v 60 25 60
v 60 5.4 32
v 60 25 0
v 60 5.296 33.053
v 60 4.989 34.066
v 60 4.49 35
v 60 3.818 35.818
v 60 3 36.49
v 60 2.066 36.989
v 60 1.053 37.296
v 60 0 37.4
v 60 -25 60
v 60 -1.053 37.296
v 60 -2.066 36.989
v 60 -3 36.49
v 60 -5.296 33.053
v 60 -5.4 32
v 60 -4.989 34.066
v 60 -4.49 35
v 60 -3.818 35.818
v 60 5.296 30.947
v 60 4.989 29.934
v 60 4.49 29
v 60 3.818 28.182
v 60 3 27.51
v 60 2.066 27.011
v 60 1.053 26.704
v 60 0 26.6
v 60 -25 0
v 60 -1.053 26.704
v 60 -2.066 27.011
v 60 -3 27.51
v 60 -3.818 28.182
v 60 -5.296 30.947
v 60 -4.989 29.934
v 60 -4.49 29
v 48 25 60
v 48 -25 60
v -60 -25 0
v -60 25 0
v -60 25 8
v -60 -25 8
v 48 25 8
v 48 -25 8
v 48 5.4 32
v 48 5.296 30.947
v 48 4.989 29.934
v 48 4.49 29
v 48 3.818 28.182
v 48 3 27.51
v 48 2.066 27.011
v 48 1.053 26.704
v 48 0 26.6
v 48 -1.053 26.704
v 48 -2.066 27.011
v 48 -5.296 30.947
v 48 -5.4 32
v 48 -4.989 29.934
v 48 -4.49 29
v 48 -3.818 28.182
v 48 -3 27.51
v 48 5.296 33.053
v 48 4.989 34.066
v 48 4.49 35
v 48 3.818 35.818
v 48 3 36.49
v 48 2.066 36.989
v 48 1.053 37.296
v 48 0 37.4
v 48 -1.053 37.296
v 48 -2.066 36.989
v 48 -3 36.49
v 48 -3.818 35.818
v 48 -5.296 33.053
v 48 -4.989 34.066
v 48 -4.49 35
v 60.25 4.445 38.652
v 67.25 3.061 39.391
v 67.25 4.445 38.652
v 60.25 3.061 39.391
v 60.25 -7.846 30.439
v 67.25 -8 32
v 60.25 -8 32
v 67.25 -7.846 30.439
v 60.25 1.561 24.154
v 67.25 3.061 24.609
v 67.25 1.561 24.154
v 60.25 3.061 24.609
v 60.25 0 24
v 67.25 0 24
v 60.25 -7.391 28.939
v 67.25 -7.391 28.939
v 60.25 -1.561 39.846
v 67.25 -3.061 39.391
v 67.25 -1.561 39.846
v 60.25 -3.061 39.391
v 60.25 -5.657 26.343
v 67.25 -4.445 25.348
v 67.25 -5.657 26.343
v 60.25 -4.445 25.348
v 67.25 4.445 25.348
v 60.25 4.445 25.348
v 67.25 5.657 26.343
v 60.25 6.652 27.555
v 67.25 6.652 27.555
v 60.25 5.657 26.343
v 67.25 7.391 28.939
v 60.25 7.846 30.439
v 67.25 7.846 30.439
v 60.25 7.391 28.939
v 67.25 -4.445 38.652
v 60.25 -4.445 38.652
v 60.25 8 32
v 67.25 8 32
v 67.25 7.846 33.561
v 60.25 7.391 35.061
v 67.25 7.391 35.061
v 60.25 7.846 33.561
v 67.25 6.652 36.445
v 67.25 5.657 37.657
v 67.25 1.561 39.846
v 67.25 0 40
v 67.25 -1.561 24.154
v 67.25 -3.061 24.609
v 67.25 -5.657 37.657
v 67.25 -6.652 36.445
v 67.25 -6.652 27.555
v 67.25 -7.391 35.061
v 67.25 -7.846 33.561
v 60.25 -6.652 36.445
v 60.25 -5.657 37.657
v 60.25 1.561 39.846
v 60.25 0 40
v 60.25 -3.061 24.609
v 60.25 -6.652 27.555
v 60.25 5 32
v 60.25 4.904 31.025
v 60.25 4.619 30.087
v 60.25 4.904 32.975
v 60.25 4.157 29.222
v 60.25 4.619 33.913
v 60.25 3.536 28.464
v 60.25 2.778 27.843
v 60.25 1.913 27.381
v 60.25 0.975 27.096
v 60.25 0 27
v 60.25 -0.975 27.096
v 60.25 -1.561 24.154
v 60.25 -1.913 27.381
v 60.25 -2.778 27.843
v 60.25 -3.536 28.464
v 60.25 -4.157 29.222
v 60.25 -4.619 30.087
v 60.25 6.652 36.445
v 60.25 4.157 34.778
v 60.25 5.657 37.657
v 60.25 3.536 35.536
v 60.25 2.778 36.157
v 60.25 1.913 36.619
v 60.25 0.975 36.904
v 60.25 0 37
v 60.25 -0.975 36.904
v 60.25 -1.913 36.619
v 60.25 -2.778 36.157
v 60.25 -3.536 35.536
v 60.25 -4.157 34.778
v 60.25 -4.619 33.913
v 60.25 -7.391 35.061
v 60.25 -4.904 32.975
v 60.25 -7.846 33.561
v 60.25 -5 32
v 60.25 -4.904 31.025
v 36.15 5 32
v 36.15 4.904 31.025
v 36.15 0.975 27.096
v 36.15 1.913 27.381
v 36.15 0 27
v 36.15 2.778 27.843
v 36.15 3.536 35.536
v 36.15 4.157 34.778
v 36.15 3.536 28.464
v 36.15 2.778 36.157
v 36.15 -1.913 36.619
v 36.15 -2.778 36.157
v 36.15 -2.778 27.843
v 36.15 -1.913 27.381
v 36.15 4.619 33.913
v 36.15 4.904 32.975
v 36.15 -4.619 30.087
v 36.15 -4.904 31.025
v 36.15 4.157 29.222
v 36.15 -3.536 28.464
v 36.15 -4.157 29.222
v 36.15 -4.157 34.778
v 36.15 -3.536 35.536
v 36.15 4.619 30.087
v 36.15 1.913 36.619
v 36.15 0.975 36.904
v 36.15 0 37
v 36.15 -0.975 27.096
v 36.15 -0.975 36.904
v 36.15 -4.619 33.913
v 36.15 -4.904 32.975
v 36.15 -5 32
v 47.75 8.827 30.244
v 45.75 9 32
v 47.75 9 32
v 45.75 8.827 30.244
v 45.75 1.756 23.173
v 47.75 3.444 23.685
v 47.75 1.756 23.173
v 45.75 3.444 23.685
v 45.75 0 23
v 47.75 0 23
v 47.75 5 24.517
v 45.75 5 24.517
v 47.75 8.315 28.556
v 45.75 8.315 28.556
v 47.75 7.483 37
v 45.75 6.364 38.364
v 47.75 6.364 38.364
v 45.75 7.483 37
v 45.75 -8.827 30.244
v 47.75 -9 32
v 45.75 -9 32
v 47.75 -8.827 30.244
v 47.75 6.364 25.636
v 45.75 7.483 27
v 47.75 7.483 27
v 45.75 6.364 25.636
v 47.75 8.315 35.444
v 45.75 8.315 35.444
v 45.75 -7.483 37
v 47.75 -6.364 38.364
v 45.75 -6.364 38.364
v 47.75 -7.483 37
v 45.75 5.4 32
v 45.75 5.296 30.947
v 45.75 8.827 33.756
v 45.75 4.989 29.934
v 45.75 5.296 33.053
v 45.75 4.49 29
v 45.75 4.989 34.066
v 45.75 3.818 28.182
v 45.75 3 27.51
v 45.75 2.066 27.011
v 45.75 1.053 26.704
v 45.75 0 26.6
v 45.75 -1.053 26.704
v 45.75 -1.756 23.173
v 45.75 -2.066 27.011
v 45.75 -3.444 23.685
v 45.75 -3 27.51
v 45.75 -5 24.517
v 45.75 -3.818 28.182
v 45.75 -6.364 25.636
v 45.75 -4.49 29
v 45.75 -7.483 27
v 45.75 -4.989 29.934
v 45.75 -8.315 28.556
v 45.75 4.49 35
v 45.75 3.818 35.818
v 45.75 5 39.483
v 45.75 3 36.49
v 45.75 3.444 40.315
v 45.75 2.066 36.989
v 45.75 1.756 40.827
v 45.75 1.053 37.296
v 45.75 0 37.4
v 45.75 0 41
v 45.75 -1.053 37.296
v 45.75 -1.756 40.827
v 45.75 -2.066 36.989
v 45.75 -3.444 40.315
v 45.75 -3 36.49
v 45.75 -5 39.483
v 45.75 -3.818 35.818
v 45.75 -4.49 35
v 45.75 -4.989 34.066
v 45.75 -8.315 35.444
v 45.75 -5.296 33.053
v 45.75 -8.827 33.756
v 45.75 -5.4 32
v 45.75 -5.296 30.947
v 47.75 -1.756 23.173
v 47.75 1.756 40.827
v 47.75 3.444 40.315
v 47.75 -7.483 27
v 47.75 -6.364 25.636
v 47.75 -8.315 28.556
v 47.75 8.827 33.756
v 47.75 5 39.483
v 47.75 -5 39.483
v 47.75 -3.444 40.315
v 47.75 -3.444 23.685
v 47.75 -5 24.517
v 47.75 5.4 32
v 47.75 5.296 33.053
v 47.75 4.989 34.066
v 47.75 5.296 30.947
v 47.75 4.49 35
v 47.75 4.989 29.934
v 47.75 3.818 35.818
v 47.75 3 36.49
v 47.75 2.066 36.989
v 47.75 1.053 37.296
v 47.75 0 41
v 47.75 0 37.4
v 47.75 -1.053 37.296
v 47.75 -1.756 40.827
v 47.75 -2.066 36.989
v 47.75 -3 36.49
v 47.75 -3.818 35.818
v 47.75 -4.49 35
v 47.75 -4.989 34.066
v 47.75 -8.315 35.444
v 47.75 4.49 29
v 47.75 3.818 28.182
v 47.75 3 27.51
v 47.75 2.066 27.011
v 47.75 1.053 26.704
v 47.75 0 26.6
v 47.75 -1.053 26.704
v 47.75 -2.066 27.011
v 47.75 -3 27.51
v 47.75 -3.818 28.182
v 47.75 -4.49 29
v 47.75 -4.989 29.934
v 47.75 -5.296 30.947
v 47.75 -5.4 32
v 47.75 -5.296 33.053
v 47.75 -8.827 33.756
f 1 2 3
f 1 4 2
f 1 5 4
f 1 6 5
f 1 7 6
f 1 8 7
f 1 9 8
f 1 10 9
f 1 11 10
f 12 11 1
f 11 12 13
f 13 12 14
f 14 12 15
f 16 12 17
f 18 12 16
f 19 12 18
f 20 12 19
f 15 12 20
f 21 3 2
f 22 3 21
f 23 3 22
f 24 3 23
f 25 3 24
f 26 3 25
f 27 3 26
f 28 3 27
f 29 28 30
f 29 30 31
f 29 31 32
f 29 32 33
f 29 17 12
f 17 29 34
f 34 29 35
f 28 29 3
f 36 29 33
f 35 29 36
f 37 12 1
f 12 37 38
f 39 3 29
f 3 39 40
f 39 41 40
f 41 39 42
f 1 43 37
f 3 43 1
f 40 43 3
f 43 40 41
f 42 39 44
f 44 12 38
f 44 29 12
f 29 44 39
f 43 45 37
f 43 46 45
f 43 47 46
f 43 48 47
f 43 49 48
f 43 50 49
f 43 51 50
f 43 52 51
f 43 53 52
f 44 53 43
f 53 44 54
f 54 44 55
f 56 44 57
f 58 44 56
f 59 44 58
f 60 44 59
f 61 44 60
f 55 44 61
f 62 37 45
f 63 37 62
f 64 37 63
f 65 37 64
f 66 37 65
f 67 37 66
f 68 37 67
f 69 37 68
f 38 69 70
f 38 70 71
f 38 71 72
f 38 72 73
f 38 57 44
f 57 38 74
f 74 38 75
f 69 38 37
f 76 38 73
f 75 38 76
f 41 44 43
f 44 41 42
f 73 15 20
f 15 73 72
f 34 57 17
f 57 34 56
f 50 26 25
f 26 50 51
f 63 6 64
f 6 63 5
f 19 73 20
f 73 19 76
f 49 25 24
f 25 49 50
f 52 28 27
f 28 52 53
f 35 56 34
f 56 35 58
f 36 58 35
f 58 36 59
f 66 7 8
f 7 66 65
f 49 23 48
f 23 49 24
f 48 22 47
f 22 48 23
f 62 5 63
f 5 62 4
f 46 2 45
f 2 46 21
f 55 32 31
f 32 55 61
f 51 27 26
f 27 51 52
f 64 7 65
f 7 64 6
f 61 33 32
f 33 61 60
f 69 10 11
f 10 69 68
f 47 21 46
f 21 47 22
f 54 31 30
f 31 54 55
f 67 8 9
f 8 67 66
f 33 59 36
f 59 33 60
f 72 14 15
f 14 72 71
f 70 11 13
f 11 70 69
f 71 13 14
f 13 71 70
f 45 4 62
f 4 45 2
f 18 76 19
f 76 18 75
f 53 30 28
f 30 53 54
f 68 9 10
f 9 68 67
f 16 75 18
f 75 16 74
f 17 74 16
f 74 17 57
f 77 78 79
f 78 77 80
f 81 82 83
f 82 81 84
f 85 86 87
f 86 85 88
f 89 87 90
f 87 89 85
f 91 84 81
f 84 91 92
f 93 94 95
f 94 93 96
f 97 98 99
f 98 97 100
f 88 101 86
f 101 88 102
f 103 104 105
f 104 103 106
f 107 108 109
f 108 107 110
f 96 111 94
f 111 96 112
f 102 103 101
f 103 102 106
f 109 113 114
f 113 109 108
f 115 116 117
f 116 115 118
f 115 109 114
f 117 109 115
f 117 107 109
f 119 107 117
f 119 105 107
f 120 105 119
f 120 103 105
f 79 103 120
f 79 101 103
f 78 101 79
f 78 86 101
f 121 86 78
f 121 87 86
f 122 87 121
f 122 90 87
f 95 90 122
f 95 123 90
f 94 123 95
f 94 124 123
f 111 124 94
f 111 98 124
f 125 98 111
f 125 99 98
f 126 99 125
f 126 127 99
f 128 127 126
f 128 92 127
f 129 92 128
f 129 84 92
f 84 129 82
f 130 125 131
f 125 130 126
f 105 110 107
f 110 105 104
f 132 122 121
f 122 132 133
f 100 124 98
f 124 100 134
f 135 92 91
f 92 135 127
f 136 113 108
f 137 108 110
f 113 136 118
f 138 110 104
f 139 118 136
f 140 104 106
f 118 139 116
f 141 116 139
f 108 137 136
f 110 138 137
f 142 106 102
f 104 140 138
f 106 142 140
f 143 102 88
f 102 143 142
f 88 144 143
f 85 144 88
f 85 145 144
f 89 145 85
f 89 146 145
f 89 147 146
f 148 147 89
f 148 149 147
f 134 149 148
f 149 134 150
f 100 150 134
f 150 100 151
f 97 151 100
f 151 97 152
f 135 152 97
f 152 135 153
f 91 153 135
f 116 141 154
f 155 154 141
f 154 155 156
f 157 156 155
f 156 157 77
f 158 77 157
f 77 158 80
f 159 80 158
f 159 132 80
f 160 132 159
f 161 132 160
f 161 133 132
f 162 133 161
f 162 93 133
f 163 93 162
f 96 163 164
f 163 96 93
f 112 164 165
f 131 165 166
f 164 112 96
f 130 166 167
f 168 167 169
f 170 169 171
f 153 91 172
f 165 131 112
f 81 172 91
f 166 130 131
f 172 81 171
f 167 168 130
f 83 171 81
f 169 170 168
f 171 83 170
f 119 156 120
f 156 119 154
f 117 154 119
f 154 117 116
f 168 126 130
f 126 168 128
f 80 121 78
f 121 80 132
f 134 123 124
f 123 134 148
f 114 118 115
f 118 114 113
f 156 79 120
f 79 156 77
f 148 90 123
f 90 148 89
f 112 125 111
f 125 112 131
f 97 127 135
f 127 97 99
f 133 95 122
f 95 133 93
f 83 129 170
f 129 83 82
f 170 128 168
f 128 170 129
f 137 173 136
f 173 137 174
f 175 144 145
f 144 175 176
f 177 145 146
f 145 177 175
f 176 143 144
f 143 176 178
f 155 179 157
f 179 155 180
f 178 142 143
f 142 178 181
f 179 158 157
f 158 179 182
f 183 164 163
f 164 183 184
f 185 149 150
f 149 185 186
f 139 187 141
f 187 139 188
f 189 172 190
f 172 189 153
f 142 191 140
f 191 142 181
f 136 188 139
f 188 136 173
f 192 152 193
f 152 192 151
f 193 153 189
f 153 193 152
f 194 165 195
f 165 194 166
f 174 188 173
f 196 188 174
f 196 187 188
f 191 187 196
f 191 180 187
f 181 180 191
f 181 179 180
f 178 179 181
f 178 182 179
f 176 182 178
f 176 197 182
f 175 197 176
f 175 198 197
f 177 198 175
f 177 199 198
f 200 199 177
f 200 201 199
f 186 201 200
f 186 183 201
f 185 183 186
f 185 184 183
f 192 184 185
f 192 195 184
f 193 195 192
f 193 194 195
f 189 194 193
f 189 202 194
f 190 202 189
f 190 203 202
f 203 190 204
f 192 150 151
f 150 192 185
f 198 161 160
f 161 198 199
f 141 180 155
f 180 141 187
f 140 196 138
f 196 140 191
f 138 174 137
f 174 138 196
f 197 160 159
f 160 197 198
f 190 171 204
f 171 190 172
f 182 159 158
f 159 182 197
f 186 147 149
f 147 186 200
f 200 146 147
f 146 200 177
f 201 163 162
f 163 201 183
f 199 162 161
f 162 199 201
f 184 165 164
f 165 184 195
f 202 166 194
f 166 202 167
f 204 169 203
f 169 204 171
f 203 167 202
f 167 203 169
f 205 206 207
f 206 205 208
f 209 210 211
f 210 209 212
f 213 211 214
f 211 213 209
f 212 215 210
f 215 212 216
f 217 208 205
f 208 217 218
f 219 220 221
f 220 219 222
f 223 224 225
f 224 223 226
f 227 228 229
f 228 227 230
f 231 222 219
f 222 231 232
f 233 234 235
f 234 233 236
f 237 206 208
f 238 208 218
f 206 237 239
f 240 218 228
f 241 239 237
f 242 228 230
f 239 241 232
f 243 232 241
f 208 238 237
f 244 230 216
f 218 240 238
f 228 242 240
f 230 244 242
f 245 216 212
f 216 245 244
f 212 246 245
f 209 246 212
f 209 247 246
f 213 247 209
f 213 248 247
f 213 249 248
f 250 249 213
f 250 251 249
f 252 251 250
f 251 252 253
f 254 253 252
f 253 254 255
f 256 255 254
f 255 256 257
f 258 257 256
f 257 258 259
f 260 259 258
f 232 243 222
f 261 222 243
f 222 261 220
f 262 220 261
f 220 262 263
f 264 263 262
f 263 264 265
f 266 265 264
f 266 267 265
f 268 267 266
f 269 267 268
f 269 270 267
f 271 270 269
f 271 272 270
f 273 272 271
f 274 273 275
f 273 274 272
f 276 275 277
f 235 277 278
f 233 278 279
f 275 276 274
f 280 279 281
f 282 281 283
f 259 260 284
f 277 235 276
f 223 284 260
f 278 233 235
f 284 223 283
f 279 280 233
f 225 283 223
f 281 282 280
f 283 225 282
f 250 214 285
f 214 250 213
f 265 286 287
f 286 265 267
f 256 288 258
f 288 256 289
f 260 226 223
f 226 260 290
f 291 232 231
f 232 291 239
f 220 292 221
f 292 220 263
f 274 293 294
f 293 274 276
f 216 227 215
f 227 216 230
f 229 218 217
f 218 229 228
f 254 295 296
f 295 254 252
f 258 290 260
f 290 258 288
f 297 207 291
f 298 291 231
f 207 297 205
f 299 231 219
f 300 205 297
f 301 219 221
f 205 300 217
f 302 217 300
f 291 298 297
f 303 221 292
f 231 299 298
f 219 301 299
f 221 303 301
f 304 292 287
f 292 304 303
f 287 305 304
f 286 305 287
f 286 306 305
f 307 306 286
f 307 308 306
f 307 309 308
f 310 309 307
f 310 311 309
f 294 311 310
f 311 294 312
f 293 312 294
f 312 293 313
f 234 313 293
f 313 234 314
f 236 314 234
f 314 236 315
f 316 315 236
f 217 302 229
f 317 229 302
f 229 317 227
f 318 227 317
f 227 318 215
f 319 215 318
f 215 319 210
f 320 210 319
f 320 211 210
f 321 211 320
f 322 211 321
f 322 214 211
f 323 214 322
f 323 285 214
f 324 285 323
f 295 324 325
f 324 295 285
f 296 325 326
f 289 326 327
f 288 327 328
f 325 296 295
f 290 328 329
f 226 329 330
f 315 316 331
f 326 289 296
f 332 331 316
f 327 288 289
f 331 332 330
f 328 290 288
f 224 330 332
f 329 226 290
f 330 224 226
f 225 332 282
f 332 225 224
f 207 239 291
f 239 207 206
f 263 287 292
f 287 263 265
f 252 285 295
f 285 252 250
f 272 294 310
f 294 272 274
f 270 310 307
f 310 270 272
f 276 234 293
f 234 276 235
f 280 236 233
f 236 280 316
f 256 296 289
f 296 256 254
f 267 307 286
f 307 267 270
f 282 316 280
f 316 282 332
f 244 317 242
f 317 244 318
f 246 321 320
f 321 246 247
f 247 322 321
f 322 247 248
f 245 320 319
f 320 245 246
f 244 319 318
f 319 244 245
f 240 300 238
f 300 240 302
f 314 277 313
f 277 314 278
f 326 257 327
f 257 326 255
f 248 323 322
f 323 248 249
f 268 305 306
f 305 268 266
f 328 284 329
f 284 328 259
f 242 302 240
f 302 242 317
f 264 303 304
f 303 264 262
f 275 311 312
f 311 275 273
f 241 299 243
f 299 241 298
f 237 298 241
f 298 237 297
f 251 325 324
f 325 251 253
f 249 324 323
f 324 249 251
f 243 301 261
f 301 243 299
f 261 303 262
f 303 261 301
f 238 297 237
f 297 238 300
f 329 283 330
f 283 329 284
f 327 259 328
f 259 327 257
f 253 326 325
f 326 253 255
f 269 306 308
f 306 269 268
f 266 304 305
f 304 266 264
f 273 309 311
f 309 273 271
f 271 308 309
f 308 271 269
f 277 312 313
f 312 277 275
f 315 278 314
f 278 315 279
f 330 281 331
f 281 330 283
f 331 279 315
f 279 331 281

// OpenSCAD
$fn = 32;

// ------------------------------------------------------------------------
// Bolted bracket: 120 x 50 mm bracket with 1 bolt joints
// Every part is its own module, assembly() places them once.
// ------------------------------------------------------------------------

// --- part 1 ---
module bracket() {
  difference() {
    translate([-60, -25, 0]) cube([120, 50, 60]);
    translate([-61, -26, 8]) cube([109, 52, 53]);
    translate([54, 0, 32]) rotate([0, 90, 0]) cylinder(h = 14, d = 10.8, center = true);
  }
}

// --- part 2 ---
module bolt() {
  cylinder(h = 7, d = 16);
  translate([0, 0, -24.1]) cylinder(h = 24.1, d = 10);
}

// --- part 3 ---
module washer() {
  difference() {
      translate([0, 0, 0]) cylinder(h = 2, d = 18);
      translate([0, 0, -1]) cylinder(h = 4, d = 10.8);
    }
}

// --- assembly ---
module assembly() {
  translate([0, 0, 0]) rotate([0, 0, 0]) bracket();
  translate([60.25, 0, 32]) rotate([0, 90, 0]) bolt();
  translate([45.75, 0, 32]) rotate([0, 90, 0]) washer();
}

assembly();
